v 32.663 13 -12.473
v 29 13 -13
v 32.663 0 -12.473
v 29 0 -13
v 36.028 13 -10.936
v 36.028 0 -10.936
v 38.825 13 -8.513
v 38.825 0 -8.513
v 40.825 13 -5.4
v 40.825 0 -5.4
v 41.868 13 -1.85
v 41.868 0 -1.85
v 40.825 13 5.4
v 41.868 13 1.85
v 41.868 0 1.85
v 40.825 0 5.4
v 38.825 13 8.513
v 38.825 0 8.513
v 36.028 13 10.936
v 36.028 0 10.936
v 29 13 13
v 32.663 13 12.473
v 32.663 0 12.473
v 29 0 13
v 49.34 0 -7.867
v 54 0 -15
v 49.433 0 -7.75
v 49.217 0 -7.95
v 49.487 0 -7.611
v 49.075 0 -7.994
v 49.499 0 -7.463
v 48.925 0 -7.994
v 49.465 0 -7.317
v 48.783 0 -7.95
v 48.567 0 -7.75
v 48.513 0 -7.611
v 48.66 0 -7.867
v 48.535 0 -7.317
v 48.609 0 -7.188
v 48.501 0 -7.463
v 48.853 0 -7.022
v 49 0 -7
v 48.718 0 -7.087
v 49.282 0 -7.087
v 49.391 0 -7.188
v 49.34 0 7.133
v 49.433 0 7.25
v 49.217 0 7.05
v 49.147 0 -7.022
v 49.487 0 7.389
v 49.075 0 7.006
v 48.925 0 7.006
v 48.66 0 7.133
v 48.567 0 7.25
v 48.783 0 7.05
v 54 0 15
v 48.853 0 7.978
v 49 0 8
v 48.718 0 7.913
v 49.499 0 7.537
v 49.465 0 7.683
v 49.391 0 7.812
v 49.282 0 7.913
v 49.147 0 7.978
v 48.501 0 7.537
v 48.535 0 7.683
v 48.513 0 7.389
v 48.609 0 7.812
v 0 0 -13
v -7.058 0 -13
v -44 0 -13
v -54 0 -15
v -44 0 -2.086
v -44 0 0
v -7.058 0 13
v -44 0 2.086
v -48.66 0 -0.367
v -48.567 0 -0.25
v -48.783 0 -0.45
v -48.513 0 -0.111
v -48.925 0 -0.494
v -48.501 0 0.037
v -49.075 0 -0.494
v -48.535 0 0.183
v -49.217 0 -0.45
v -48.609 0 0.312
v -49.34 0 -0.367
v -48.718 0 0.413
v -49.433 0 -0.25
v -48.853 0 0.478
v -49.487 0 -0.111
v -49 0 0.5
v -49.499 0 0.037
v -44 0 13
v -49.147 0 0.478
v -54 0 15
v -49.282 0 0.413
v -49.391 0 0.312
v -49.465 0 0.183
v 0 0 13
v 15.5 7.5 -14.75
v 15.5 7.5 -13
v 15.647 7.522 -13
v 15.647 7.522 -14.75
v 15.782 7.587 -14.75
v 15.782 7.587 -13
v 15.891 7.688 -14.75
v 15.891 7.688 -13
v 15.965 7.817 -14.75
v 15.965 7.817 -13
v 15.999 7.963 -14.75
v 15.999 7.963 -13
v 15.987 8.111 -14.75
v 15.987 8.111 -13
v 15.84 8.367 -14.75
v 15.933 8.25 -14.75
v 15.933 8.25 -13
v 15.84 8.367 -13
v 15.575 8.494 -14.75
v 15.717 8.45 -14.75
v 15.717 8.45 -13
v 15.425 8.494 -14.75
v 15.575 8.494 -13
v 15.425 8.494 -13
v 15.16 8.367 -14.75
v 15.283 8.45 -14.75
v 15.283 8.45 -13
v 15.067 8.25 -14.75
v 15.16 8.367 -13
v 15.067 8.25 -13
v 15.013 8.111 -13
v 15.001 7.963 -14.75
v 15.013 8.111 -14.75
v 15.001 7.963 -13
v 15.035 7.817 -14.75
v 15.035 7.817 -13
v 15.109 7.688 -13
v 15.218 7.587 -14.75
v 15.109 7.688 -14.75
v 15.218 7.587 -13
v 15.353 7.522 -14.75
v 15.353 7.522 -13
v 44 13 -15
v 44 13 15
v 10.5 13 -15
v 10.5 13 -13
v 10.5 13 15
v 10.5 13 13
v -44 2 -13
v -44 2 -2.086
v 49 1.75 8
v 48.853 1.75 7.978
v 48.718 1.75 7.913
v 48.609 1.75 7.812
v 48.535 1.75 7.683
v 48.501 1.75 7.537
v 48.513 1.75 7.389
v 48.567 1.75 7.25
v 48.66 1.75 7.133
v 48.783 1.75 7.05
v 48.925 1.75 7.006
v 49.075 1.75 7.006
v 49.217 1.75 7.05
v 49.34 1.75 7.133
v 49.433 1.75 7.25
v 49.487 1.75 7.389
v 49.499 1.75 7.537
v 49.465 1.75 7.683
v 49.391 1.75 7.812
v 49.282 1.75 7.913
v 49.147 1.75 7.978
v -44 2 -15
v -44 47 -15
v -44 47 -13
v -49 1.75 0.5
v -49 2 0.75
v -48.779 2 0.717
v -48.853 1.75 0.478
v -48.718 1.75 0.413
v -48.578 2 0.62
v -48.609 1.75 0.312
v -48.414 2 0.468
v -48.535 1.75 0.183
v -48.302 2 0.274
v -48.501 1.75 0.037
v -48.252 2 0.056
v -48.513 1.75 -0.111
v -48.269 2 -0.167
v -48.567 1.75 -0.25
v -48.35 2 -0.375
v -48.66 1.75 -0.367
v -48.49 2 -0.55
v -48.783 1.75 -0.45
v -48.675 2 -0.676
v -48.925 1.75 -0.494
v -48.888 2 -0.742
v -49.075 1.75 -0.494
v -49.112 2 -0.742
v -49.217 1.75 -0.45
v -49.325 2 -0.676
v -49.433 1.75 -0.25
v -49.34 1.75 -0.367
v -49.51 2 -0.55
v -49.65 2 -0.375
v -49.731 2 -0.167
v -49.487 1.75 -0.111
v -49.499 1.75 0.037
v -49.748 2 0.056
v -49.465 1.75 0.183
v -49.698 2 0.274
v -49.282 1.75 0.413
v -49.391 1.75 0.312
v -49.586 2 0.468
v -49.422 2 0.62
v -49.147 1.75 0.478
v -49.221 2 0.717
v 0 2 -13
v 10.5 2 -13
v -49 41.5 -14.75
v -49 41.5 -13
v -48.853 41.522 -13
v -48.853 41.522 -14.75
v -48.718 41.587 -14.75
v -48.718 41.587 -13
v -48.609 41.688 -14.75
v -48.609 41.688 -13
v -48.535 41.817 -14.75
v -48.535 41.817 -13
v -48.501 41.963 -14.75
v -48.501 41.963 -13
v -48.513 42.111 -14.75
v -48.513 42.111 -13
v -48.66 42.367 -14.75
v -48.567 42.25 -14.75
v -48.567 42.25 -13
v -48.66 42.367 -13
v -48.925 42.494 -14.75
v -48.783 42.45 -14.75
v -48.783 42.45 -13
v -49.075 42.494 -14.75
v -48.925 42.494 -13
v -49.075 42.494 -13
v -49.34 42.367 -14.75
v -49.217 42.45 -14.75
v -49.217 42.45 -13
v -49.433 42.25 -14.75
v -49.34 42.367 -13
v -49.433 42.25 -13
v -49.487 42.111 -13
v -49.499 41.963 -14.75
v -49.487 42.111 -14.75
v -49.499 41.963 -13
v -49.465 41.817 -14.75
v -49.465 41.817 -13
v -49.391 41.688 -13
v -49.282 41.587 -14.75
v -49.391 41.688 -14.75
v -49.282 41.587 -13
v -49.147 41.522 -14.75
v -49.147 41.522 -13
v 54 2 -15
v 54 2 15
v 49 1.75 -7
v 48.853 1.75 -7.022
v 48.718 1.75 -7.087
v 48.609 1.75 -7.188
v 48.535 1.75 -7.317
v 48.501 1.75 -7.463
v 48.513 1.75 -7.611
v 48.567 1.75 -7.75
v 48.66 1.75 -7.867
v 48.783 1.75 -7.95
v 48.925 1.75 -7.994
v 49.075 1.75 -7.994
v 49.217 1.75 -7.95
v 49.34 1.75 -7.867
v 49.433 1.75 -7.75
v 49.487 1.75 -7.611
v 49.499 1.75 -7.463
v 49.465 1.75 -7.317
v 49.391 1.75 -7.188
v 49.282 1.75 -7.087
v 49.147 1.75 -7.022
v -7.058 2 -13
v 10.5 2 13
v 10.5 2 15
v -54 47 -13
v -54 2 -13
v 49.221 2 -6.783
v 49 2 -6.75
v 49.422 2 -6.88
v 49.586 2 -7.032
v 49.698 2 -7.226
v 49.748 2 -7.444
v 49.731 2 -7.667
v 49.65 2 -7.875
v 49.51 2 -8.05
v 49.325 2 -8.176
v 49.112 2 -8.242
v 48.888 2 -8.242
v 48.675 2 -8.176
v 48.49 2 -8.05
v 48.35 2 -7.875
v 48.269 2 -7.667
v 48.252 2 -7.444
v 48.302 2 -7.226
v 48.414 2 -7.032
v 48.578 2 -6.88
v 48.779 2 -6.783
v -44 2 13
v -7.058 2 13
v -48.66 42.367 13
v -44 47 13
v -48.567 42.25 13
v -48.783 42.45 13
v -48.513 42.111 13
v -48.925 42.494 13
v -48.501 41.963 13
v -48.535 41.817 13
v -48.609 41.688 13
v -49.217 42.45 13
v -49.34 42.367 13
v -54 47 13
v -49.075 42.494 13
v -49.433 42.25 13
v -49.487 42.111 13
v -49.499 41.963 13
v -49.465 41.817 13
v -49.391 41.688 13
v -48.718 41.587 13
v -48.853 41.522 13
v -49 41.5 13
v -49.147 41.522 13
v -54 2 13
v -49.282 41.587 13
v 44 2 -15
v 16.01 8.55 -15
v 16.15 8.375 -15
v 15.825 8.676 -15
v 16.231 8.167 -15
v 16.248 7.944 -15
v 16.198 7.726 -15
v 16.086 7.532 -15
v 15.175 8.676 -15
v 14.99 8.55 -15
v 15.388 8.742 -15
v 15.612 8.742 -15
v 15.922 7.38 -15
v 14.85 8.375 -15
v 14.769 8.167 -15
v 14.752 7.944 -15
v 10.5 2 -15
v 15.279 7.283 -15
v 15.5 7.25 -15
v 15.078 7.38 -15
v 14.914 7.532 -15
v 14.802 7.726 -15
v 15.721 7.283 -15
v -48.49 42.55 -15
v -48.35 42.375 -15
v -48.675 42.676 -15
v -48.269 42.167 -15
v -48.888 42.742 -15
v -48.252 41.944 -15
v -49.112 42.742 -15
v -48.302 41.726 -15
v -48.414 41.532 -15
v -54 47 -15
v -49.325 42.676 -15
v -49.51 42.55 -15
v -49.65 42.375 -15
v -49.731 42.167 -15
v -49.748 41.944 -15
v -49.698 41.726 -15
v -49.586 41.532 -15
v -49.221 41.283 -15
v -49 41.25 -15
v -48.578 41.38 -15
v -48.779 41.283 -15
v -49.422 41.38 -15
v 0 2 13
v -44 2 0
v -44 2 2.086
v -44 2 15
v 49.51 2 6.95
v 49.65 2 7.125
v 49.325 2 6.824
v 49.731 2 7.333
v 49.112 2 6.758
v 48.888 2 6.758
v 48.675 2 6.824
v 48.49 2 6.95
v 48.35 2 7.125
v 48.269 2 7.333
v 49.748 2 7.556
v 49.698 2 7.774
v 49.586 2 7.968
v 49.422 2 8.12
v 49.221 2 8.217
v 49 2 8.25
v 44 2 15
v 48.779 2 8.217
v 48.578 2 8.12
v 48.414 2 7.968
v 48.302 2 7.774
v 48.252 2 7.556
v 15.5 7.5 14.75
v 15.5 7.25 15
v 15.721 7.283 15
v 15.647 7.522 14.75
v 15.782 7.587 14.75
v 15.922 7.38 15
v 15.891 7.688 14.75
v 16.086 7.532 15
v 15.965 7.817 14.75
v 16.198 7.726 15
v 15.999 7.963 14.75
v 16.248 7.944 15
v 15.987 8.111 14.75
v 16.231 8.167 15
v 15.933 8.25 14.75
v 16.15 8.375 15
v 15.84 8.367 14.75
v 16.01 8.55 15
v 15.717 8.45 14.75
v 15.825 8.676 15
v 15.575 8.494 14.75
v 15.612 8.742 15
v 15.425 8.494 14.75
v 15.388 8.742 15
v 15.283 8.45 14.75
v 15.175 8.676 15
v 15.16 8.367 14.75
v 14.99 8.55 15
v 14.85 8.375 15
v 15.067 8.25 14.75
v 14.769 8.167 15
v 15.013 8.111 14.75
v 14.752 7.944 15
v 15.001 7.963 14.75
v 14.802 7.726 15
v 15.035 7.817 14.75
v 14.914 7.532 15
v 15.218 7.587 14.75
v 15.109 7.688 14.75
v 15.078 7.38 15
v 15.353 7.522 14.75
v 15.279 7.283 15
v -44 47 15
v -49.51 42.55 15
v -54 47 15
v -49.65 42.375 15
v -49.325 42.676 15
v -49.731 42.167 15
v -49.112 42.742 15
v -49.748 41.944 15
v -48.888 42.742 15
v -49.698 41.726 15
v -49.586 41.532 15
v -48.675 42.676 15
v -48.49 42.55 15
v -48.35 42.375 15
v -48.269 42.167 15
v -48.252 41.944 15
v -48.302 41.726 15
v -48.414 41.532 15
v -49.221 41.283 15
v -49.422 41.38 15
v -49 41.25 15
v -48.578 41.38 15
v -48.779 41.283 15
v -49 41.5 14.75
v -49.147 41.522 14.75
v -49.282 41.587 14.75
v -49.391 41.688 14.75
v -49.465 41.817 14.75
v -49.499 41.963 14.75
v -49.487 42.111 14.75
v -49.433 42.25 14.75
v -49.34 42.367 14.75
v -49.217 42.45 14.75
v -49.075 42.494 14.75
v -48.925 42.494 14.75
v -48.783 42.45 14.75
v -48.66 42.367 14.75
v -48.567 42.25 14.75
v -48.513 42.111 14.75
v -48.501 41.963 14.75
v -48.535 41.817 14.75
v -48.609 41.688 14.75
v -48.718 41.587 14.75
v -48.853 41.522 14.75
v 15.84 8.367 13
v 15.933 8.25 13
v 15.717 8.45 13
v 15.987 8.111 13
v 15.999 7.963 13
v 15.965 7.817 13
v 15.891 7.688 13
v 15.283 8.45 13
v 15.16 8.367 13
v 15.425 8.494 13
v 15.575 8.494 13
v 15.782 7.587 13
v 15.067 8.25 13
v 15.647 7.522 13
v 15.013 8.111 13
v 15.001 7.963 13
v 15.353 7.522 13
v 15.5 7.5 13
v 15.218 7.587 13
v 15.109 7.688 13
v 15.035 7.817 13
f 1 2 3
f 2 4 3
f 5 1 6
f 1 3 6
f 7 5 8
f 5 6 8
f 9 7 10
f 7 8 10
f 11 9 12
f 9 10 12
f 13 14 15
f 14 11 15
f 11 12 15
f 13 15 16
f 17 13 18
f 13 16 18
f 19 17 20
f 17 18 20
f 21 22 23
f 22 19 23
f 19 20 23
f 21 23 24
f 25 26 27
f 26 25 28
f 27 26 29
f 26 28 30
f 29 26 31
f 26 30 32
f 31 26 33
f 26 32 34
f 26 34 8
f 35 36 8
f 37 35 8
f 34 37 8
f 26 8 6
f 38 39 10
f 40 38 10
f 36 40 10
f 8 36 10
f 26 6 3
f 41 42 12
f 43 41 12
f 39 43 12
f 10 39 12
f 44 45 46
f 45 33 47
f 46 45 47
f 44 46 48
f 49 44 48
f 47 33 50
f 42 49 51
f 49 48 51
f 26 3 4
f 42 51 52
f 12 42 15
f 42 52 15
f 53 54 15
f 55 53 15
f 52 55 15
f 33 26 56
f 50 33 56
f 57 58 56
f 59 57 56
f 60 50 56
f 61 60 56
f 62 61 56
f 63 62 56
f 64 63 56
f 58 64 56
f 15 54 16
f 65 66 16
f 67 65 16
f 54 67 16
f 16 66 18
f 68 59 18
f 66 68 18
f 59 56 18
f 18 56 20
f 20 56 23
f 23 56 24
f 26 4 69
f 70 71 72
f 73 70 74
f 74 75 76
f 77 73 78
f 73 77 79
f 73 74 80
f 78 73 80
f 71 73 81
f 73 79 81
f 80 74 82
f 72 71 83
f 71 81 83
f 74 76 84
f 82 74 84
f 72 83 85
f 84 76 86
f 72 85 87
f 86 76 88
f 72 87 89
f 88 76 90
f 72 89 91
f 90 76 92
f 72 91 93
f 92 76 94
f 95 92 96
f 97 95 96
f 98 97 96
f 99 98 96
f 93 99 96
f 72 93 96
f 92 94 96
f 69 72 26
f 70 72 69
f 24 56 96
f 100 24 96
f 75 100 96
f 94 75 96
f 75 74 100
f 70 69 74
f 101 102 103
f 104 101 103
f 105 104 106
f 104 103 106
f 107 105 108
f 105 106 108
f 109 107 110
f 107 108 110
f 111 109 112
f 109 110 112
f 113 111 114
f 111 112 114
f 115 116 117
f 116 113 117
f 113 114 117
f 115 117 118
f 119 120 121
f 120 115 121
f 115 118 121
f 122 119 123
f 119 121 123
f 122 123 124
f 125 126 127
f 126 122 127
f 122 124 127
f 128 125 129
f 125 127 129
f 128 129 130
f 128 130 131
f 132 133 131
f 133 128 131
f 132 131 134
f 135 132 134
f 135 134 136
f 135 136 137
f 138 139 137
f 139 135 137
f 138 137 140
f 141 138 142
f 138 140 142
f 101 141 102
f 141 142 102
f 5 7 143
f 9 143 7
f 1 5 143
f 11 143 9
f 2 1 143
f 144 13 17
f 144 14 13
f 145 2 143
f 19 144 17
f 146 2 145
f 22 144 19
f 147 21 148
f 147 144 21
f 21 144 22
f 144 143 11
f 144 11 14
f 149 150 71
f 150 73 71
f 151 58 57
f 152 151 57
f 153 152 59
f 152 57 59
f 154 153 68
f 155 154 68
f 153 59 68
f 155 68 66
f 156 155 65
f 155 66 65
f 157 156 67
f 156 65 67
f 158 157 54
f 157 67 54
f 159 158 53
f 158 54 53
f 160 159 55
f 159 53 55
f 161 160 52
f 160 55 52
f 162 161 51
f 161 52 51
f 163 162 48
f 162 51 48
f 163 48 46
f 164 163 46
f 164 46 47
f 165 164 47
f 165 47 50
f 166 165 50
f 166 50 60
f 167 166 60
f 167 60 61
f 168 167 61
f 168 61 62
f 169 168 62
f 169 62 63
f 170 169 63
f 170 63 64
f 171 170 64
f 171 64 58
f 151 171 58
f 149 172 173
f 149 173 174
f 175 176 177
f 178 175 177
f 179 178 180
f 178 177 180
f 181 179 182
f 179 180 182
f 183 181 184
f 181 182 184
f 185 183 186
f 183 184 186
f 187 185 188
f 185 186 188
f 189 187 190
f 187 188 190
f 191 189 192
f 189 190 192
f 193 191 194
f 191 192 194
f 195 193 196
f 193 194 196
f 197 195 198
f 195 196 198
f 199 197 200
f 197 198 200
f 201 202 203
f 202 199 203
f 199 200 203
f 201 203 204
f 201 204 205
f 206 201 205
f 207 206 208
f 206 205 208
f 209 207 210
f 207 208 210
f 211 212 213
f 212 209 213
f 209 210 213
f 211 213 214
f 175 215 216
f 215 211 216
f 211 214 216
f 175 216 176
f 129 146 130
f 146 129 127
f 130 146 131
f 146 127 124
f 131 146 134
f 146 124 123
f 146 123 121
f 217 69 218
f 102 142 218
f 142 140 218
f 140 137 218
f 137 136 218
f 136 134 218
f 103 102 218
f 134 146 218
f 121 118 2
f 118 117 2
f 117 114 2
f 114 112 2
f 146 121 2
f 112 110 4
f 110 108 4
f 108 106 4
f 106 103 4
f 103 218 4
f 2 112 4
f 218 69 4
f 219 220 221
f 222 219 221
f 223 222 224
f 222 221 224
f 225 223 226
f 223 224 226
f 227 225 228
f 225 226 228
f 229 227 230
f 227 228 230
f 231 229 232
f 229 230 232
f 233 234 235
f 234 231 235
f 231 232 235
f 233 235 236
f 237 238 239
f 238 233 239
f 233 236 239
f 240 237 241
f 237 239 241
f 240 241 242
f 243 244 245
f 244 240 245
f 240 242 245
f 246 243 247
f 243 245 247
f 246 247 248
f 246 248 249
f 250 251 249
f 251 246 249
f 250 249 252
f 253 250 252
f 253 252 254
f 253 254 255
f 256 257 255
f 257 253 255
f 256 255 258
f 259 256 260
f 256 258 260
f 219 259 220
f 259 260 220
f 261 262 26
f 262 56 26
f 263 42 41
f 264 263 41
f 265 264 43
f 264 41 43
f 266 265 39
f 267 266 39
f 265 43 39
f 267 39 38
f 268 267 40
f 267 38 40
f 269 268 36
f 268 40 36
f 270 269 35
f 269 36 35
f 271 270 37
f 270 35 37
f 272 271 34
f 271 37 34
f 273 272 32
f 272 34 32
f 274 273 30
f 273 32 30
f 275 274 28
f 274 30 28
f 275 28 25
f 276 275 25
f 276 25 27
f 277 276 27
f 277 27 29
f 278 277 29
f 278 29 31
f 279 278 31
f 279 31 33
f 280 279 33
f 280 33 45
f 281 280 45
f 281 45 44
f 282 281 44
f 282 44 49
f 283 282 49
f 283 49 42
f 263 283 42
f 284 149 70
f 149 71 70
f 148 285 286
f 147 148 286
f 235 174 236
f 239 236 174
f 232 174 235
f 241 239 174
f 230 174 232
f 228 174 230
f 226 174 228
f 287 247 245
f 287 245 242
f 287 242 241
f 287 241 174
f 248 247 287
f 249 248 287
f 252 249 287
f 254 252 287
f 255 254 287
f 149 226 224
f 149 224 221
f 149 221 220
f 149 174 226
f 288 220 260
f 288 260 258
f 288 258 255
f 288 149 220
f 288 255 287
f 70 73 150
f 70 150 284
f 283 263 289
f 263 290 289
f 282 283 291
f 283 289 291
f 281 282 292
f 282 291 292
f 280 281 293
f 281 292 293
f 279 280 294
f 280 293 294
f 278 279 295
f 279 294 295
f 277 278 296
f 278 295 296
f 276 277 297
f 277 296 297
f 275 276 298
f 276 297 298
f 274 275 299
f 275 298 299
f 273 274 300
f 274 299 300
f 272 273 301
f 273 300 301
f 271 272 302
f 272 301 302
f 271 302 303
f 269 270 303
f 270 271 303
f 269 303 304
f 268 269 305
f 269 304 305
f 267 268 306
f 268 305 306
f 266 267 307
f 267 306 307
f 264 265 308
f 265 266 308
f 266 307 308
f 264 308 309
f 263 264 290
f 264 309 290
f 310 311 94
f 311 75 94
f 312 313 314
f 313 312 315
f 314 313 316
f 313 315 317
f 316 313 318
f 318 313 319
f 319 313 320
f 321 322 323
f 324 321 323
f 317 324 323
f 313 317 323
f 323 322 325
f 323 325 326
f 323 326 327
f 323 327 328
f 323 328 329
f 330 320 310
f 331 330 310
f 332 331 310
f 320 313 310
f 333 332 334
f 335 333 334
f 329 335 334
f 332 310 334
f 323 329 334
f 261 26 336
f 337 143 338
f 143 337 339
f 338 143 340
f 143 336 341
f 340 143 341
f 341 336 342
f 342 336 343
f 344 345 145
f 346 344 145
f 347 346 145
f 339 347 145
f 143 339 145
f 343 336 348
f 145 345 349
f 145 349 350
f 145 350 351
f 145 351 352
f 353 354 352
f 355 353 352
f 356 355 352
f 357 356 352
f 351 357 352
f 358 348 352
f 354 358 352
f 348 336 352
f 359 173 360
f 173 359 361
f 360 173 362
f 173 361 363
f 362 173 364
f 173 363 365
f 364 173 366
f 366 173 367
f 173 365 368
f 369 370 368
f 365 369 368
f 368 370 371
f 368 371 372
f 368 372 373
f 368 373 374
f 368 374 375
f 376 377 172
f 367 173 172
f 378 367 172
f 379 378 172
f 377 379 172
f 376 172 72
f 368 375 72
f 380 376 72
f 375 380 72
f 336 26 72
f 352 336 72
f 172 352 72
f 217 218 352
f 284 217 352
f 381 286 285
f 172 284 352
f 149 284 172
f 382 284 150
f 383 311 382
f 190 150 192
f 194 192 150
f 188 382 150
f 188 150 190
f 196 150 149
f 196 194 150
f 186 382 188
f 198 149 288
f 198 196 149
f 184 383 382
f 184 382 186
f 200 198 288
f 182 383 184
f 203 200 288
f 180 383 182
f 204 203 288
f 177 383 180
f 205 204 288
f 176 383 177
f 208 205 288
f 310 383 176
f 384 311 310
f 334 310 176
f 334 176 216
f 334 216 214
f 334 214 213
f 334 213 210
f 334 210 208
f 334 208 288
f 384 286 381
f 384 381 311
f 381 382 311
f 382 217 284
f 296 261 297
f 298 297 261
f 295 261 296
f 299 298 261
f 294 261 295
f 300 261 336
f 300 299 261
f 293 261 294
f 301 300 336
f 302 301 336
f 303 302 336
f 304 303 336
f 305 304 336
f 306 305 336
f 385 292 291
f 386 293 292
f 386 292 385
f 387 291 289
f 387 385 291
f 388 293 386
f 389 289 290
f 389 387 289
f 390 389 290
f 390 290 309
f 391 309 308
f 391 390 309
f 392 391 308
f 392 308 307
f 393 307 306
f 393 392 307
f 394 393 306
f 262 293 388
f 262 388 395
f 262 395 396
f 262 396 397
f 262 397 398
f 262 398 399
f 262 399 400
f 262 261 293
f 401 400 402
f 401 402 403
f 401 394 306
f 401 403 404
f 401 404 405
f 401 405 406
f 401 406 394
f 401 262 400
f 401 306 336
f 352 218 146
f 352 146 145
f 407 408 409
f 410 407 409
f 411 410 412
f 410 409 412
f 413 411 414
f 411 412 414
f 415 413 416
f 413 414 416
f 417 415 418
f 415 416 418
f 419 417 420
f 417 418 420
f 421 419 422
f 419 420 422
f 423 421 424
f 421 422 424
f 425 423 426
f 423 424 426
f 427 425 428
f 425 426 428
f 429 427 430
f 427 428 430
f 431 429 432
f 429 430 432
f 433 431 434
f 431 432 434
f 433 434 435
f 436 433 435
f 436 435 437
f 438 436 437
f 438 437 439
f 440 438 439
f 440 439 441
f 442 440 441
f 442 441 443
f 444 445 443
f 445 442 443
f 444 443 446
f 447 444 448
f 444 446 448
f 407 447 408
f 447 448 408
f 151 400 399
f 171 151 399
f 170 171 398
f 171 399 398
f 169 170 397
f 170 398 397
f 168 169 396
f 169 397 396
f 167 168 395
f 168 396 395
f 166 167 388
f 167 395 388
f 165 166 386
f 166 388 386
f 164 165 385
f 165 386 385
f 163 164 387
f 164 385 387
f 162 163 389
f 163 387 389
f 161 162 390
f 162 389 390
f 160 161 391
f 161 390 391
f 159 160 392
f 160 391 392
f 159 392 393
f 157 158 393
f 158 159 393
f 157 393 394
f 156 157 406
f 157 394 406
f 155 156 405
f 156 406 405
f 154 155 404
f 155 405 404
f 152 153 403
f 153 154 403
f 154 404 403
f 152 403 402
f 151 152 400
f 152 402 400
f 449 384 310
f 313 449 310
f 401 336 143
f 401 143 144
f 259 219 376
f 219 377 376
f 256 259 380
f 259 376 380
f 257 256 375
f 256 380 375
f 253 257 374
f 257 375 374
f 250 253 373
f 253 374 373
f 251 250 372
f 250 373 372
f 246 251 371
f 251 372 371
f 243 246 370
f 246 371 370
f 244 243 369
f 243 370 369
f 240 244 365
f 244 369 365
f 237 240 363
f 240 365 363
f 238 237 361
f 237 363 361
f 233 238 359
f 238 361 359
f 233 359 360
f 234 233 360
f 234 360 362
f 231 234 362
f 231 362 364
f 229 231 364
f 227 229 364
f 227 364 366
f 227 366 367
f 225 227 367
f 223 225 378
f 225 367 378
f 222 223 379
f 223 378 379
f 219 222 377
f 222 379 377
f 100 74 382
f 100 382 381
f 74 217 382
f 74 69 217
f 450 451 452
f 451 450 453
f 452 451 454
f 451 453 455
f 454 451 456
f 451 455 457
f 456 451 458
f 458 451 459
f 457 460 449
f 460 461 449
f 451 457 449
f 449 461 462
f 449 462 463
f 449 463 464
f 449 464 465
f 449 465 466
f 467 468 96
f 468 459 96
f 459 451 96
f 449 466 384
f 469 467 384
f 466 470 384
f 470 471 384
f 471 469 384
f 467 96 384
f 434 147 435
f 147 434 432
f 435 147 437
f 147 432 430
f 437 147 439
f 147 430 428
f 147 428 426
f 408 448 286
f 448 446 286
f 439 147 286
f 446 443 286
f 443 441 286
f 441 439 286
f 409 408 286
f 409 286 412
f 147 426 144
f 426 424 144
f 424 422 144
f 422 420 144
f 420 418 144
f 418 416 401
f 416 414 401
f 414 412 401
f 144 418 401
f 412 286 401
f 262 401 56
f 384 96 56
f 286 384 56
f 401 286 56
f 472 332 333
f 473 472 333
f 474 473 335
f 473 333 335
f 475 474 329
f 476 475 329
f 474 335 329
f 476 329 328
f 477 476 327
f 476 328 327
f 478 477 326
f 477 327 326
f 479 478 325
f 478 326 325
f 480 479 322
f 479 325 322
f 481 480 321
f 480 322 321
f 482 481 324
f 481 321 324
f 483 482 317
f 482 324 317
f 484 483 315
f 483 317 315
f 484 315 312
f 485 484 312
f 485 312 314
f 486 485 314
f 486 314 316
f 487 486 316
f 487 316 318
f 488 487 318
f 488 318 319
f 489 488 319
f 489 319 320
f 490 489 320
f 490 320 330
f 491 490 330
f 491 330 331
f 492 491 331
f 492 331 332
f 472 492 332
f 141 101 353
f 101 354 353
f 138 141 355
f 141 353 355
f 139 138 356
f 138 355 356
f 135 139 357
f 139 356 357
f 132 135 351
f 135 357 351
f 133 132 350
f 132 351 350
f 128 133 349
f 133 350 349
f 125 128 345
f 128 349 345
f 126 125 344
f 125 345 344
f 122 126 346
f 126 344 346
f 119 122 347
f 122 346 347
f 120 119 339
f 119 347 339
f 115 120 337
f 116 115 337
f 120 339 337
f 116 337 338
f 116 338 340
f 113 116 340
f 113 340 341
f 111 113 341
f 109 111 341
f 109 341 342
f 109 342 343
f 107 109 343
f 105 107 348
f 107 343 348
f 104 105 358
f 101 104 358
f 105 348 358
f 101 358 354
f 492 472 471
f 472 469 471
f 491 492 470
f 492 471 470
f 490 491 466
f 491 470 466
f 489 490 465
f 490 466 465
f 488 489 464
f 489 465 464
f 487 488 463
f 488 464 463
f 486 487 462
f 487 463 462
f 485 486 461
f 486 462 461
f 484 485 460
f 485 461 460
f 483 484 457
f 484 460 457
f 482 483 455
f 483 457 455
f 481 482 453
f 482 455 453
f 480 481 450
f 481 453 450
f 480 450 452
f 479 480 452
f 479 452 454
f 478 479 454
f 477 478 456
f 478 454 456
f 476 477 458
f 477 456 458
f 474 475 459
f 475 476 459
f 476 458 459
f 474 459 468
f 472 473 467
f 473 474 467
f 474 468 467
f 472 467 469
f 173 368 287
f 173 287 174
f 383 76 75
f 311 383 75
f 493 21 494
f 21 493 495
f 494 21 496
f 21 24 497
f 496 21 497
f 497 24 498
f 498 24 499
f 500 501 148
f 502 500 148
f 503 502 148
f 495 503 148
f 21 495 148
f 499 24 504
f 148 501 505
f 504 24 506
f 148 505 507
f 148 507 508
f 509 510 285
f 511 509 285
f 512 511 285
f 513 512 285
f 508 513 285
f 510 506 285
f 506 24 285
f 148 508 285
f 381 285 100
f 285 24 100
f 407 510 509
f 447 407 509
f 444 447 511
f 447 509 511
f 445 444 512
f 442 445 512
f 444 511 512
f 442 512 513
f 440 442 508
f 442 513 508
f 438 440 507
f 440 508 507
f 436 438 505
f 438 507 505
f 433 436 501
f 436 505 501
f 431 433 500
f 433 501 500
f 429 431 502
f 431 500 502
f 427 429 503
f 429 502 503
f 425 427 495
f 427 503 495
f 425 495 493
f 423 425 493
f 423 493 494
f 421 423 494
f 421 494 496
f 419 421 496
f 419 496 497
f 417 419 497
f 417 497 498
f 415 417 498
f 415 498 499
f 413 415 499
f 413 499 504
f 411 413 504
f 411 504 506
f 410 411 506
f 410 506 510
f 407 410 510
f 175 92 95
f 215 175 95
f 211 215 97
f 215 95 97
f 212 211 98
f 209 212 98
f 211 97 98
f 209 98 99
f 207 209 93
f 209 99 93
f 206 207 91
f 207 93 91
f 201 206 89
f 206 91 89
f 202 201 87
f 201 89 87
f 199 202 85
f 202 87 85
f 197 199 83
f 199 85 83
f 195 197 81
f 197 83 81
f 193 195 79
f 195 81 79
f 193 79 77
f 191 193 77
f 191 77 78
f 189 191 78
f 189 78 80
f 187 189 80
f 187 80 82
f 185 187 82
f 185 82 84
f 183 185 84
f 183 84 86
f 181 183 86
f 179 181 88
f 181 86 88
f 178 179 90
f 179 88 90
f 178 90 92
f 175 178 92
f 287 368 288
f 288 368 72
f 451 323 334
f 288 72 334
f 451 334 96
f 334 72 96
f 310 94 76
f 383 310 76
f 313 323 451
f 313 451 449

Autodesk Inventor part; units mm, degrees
ref_plane "YZ Plane" through (0, 0, 0) normal (1, 0, 0) x (0, 1, 0)
ref_plane "XZ Plane" through (0, 0, 0) normal (0, 1, 0) x (-1, 0, 0)
ref_plane "XY Plane" through (0, 0, 0) normal (0, 0, 1) x (1, 0, 0)
sketch "Эскиз1" plane through (0, 0, 0) normal (0, 1, 0) x (-1, 0, 0)
  line L0 (54, 15) -> (-54, 15)
  line L1 (-54, 15) -> (-54, -15)
  line L2 (-54, -15) -> (54, -15)
  line L3 (54, -15) -> (54, 15)
  line L4 (-54, 15) -> (54, -15) construction
  line L5 (-54, -15) -> (54, 15) construction
  line L6 (0, -21) -> (0, 21) construction
  line L7 (44, -13) -> (7.0585, -13)
  line L8 (-44, -13) -> (-44, 13)
  line L9 (-44, 13) -> (0, 13)
  line L10 (44, 13) -> (44, 2.0855)
  line L11 (75.6, 0) -> (-75.6, 0) construction
  line L12 (49, -15) -> (49, 15) construction
  line L13 (0, -13) -> (44, 0)
  line L14 (44, -2.0855) -> (7.0585, -13)
  line L15 (0, -15) -> (0, -13) construction
  line L16 (0, 13) -> (0, 15) construction
  line L17 (44, -2.0855) -> (43.4333, -0.1674) construction
  line L18 (44, 0) -> (0, 13)
  line L19 (44, 2.0855) -> (7.0585, 13)
  line L20 (44, 2.0855) -> (43.4333, 0.1674) construction
  line L21 (44, 2.0855) -> (44, -2.0855) construction
  line L22 (44, -2.0855) -> (44, -13)
  line L23 (7.0585, -13) -> (0, -13) construction
  line L24 (0, -13) -> (-44, -13)
  line L25 (7.0585, 13) -> (44, 13)
  line L26 (0, 13) -> (7.0585, 13) construction
  point P0 (0, 0)
  point P1 (0, -14)
  point P2 (0, 14)
  point P3 (0, 0)
  dimension "d0" = 108
  dimension "d8" = 10
  dimension "d9" = 5
  dimension "d28" = 26
  dimension "d46" = 2
  dimension "d47" = 10
extrude "Выдавливание1" add sketch "Эскиз1" along normal blind 2
sketch "Эскиз2" plane through (0, 0, 0) normal (0, 1, 0) x (-1, 0, 0)
  line L0 (-42, -13) -> (-42, 13) construction
  line L1 (-42, -13) -> (-29, -13) construction
  line L2 (-10.5, -13) -> (-10.5, -15)
  line L3 (-10.5, -15) -> (-44, -15)
  line L4 (-42, 13) -> (-29, 13) construction
  line L5 (-10.5, 15) -> (-44, 15)
  line L6 (-10.5, 13) -> (-10.5, 15)
  arc A0 (-29, 13) -> (-29, -13) centre (-29, 0) ccw
  line L7 (-29, -13) -> (-10.5, -13)
  line L8 (-29, 13) -> (-10.5, 13)
  line L9 (-44, -15) -> (-44, 15)
  line L10 (-44, -13) -> (-44, 13) construction
  line L11 (0, -13) -> (-44, -13) construction
  line L12 (-54, -15) -> (54, -15) construction
  line L13 (-44, 13) -> (0, 13) construction
  line L14 (54, 15) -> (-54, 15) construction
  point P0 (0, 0)
  dimension "d17" = 31.5
  dimension "d48" = 2
extrude "Выдавливание2" add sketch "Эскиз2" along normal blind 13
sketch "Эскиз4" plane through (0, 2, 0) normal (0, 1, 0) x (1, 0, 0)
  line L0 (-54, 15) -> (-54, -15) construction
  line L1 (-44, 13) -> (-54, 13)
  line L2 (-54, 13) -> (-54, 15)
  line L3 (-54, 15) -> (-44, 15)
  line L4 (-44, 15) -> (-44, 13)
  line L5 (44, -13) -> (0, -13) construction
  line L6 (-54, -15) -> (54, -15) construction
  line L7 (-44, -13) -> (-54, -13)
  line L8 (-54, -13) -> (-54, -15)
  line L9 (-54, -15) -> (-44, -15)
  line L10 (-44, -15) -> (-44, -13)
  point P0 (0, 0)
  point P1 (10.5, -13)
  point P2 (-44, -15)
extrude "Выдавливание4" add sketch "Эскиз4" along normal blind 45
sketch "Эскиз3" plane through (-54, 0, 15) normal (0, 0, 1) x (1, 0, 0)
  line L0 (64.5, 2) -> (64.5, 13) construction
  line L1 (64.5, 13) -> (74.5, 13) construction
  line L2 (74.5, 13) -> (74.5, 3) construction
  line L3 (74.5, 3) -> (64.5, 3) construction
  line L4 (64.5, 3) -> (64.5, 13) construction
  line L5 (64.5, 2) -> (54, 2) construction
  line L6 (74.5, 3) -> (64.5, 13) construction
  line L7 (74.5, 13) -> (64.5, 3) construction
  circle A0 centre (69.5, 8) radius 0.5
  line L8 (0, 47) -> (10, 47) construction
  line L9 (10, 2) -> (10, 47) construction
  line L10 (0, 47) -> (10, 47) construction
  line L11 (10, 47) -> (10, 37) construction
  line L12 (10, 37) -> (0, 37) construction
  line L13 (0, 37) -> (0, 47) construction
  line L14 (0, 37) -> (10, 47) construction
  line L15 (0, 0) -> (0, 47) construction
  line L16 (10, 37) -> (0, 47) construction
  circle A1 centre (5, 42) radius 0.5
  point P0 (54, 0)
  point P1 (128, 2)
  dimension "d20" = 10
  dimension "d21" = 1
  dimension "d26" = 10
  dimension "d27" = 1
hole "Отверстие1" at (-49, 42, 15) at (15.5, 8, 15) direction (0, 0, -1) diameter 1 depth 2 countersink diameter 1.5 countersink angle 90
mirror "Зеркальное отражение1" about plane through (0, 0, 0) normal (0, 0, 1) of "Отверстие1"
sketch "Эскиз5" plane through (0, 2, 0) normal (0, 1, 0) x (1, 0, 0)
  line L0 (10.5, 13) -> (10.5, 15) construction
  line L1 (-44, 15) -> (10.5, 15) construction
  line L2 (-54, 15) -> (-44, 15) construction
  line L3 (-54, 13) -> (-54, 15) construction
  line L4 (-44, 13) -> (-54, 13) construction
  line L5 (-44, -13) -> (-44, -15) construction
  line L6 (-44, -15) -> (-54, -15) construction
  line L7 (-54, -15) -> (-54, -13) construction
  line L8 (-54, -13) -> (-54, 13) construction
  line L9 (10.5, -15) -> (10.5, -13) construction
  line L10 (10.5, 15) -> (44, 15) construction
  line L11 (54, -15) -> (44, -15) construction
  line L12 (54, 15) -> (54, -15) construction
  line L13 (44, 15) -> (54, 15) construction
  line L14 (-44, 15) -> (-44, 13) construction
  line L15 (-54, -13) -> (-44, -13) construction
  line L16 (44, -15) -> (10.5, -15) construction
  line L17 (54, 15) -> (-54, 15) construction
  line L18 (54, 15) -> (44, 0) construction
  line L19 (-54, -15) -> (54, -15) construction
  line L20 (54, -15) -> (44, 0) construction
  line L21 (-54, 13) -> (-44, -13) construction
  line L22 (-44, -13) -> (-44, -2.0855) construction
  line L23 (-54, -13) -> (-44, 13) construction
  line L24 (54, -15) -> (54, 15) construction
  line L25 (54, 0) -> (44, 15) construction
  line L26 (44, -15) -> (54, 0) construction
  circle A0 centre (-49, 0) radius 0.5
  circle A1 centre (49, 7.5) radius 0.5
  circle A2 centre (49, -7.5) radius 0.5
  line L27 (-44, 2.0855) -> (-7.0585, 13) projected
  line L28 (-7.0585, 13) -> (-44, 13) projected
  line L29 (-44, -13) -> (-7.0585, -13) projected
  line L30 (-7.0585, -13) -> (-44, -2.0855) projected
  line L31 (-44, -2.0855) -> (-44, -13) projected
  line L32 (-44, 13) -> (-44, 2.0855) projected
  line L33 (10.5, 13) -> (0, 13) projected
  line L34 (0, 13) -> (-44, 0) projected
  line L35 (-44, 0) -> (0, -13) projected
  line L36 (0, -13) -> (10.5, -13) projected
  line L37 (10.5, -13) -> (29, -13) projected
  arc A3 (29, -13) -> (29, 13) centre (29, 0) ccw projected
  line L38 (29, 13) -> (10.5, 13) projected
  line L39 (44, 15) -> (44, -15) projected
  line L40 (10.5, -15) -> (-44, -15) projected
  point P0 (0, 0)
  dimension "d38" = 1
hole "Отверстие2" at (-49, 2, 0) at (49, 2, 7.5) at (49, 2, -7.5) direction (0, -1, 0) diameter 1 end through all countersink diameter 1.5 countersink angle 90
properties part number "frame"
